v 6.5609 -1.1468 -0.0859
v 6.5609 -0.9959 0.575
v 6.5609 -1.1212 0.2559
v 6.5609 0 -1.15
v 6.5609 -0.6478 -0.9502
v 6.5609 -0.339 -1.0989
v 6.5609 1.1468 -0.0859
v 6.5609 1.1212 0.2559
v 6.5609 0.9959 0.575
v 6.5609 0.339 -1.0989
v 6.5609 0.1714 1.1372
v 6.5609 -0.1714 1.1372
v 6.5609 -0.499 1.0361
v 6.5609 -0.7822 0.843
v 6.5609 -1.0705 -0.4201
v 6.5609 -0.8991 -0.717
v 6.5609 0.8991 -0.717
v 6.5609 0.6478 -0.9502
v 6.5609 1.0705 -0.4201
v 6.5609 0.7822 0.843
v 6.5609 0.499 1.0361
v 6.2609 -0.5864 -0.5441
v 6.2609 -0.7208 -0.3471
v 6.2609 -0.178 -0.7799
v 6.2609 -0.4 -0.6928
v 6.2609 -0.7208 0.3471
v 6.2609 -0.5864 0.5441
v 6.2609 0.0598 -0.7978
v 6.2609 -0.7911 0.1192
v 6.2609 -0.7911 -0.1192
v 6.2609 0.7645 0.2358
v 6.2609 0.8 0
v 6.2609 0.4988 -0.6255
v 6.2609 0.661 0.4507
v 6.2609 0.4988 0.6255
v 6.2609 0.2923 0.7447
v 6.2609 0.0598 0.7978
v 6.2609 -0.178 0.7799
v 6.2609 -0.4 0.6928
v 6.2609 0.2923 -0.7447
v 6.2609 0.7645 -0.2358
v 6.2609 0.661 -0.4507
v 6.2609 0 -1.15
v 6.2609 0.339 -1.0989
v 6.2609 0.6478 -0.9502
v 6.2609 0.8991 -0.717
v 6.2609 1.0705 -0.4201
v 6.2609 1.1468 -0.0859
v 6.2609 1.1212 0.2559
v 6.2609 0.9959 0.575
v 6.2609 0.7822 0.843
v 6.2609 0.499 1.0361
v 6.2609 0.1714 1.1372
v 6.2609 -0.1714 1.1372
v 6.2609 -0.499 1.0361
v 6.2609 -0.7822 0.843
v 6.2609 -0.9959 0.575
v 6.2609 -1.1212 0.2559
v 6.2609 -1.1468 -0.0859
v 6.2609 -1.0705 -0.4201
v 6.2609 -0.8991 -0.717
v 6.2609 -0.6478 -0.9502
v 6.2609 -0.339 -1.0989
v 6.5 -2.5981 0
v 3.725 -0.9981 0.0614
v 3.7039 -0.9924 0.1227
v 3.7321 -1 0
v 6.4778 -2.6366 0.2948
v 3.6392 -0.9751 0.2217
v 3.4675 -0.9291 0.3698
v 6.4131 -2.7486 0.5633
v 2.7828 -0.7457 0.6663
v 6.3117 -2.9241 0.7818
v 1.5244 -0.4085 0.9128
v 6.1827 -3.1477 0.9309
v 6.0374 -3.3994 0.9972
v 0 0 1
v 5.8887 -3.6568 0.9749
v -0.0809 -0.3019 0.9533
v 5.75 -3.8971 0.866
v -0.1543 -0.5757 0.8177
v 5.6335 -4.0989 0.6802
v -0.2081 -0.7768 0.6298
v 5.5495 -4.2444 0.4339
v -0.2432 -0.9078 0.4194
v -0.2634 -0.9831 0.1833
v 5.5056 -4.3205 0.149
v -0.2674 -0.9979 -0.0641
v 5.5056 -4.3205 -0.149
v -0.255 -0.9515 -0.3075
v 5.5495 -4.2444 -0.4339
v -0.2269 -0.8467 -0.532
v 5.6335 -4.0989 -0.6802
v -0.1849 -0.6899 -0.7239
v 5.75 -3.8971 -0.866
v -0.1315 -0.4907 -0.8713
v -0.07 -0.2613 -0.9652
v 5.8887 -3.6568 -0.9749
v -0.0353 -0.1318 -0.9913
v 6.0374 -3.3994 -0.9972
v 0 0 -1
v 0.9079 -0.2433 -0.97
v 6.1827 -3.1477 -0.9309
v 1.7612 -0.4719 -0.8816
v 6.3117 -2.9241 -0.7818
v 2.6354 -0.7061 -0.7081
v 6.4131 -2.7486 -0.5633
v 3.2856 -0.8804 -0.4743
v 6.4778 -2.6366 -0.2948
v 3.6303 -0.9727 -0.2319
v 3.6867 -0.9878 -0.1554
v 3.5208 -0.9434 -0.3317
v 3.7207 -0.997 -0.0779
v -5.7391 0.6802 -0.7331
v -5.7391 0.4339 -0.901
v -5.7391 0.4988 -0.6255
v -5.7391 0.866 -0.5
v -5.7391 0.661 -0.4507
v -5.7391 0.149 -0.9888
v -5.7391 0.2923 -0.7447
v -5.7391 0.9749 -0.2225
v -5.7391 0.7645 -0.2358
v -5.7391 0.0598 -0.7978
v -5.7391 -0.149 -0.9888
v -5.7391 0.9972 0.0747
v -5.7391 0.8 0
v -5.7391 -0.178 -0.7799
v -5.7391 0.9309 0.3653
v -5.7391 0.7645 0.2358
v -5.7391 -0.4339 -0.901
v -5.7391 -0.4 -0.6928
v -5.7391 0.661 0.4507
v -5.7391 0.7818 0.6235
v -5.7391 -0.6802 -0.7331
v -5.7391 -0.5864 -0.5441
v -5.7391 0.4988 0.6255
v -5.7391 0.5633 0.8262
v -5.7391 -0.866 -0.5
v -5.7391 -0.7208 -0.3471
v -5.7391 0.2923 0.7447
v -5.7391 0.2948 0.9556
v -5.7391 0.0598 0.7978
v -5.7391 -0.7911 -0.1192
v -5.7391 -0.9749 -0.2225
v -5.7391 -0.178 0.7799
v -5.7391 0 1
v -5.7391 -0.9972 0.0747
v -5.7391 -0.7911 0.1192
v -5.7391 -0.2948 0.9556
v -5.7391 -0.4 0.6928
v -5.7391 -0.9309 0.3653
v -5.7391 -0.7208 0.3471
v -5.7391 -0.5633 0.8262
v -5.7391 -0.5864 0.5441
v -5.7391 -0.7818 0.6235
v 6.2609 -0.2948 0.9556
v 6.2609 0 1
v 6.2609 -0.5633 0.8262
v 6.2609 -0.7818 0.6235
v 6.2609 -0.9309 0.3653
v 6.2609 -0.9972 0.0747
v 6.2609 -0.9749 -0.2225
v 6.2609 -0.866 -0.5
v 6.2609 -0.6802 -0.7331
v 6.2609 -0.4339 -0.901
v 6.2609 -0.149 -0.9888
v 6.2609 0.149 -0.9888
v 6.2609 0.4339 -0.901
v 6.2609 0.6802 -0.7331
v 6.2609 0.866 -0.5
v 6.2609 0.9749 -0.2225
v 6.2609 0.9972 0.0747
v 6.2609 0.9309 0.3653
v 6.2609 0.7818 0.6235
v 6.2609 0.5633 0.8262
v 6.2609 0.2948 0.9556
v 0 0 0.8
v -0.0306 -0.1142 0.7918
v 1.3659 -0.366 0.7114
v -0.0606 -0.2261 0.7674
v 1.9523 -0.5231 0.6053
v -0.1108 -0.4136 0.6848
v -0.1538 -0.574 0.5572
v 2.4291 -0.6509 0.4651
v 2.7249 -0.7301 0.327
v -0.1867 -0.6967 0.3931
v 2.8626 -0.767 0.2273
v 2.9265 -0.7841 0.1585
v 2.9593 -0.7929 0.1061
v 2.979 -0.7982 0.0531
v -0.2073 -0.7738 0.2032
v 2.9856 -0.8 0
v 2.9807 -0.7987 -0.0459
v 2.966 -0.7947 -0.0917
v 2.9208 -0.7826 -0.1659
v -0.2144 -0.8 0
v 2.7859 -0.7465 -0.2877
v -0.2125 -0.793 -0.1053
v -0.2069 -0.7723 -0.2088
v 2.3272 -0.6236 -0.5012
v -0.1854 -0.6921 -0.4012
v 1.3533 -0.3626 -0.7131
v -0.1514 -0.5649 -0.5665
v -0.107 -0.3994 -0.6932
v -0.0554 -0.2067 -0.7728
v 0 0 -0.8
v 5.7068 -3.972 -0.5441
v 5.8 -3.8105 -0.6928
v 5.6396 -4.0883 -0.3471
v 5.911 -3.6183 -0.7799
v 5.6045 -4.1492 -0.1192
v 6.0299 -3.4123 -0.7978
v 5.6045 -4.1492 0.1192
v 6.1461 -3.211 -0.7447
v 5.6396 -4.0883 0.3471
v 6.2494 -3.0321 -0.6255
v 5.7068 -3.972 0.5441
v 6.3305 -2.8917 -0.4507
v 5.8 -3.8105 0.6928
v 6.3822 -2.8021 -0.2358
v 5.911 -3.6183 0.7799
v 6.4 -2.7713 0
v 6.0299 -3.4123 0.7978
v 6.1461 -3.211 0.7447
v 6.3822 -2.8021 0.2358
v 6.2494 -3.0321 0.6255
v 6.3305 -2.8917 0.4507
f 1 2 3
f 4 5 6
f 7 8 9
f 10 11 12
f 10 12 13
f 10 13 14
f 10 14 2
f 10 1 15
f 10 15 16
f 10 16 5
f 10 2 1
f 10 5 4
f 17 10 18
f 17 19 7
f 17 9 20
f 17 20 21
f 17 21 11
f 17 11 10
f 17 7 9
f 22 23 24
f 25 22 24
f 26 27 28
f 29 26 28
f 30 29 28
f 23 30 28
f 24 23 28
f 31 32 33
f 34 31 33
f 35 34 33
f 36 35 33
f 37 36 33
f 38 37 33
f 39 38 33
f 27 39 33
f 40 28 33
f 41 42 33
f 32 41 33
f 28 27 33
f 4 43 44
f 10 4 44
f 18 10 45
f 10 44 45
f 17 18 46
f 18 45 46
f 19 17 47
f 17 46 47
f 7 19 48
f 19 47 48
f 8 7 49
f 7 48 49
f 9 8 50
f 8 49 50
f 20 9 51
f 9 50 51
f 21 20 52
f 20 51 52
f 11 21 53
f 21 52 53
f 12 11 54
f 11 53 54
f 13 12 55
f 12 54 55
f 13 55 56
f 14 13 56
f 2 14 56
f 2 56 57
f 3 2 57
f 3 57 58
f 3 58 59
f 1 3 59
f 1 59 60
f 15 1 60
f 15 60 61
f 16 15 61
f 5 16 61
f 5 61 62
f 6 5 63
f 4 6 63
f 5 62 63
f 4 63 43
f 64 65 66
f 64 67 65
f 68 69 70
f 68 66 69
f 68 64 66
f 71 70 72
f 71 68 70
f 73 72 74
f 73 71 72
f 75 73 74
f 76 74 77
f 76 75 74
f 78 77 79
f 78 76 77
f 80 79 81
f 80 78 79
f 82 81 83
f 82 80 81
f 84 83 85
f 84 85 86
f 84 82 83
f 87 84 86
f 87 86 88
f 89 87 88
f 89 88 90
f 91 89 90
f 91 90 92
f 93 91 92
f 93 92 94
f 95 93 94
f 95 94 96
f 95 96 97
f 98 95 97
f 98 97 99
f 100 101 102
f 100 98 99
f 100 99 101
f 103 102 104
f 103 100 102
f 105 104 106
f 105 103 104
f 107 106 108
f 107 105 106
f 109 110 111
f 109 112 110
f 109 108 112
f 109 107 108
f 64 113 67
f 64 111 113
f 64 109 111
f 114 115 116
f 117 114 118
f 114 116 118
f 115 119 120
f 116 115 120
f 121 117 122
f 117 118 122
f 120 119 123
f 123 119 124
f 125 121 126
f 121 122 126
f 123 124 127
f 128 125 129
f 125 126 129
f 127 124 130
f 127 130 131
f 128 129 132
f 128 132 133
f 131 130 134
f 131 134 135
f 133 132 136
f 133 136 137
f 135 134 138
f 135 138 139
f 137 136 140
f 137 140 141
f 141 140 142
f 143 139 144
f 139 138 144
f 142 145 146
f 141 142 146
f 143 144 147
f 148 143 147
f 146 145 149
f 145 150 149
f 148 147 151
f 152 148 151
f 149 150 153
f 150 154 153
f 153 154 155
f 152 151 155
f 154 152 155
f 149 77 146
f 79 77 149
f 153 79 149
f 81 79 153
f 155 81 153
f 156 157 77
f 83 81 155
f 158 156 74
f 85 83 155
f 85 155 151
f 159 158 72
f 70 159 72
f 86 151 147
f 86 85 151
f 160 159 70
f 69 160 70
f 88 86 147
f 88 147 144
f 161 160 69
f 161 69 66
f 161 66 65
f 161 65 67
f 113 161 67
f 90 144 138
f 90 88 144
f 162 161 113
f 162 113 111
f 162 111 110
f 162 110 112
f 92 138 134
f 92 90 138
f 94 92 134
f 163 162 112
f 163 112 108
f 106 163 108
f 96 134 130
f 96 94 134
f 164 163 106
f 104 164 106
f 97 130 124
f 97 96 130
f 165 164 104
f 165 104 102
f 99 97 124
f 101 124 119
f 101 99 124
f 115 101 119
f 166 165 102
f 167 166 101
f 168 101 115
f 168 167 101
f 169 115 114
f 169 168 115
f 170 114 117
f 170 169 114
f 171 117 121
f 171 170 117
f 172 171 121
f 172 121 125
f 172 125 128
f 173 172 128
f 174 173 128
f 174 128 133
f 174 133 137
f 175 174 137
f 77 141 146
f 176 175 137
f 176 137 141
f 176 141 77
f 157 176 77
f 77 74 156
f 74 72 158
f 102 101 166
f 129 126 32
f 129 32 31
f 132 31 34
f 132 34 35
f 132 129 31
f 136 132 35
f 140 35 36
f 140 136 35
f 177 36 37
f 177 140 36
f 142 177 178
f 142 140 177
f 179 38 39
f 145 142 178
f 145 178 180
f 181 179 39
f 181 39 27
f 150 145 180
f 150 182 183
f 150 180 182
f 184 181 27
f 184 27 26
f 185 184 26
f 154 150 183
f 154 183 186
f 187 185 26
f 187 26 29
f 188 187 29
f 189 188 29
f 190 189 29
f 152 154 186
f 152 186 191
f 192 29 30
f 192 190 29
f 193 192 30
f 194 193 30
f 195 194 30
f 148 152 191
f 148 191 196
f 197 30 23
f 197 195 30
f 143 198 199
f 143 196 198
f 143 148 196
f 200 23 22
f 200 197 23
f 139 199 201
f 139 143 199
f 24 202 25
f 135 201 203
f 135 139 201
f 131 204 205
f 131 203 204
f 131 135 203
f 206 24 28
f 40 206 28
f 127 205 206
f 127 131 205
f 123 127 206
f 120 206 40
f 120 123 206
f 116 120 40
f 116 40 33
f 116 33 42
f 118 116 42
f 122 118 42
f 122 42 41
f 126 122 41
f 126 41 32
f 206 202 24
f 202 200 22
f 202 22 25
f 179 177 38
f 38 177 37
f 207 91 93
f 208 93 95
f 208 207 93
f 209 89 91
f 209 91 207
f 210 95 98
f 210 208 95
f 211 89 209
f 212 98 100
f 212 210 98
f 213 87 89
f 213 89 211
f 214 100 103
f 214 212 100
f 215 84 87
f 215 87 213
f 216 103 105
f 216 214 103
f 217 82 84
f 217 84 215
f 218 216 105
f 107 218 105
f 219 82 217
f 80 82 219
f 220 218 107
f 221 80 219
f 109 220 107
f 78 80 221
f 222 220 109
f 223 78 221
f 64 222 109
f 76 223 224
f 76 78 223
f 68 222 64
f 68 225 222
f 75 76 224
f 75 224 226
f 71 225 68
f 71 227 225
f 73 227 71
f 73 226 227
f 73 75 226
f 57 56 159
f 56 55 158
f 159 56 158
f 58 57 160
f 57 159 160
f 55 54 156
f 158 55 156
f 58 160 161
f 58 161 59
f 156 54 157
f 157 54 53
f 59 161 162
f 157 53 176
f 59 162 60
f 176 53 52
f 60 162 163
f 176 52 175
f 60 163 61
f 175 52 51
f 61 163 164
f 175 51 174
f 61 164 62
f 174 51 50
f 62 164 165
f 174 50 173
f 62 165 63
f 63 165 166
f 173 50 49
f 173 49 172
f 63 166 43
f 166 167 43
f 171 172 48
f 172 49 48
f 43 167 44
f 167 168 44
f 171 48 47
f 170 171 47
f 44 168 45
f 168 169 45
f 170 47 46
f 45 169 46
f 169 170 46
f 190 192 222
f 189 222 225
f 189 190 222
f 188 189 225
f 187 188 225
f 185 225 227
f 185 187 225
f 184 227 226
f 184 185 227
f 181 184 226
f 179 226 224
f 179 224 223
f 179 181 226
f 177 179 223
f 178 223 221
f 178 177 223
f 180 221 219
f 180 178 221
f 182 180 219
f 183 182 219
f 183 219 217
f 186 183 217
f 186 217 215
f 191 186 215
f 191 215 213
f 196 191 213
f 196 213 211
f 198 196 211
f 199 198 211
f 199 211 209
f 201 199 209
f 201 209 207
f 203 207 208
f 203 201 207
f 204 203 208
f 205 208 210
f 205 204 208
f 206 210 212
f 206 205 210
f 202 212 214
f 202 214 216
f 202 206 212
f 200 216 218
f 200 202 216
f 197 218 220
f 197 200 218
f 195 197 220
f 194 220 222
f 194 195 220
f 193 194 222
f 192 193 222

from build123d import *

# Parameters (mm, degrees)
SWEEP1_PROFILE_R    = 10
SWEEP2_PROFILE_R    = 10
SHELL2_START        = -57.391158908
SHELL2_OUTLINE_R    = 8
SHELL2_DEPTH        = 120
SHELL2_START_2      = -1e-07
SHELL2_2_OUTLINE_R  = 8
SHELL2_2_DEPTH      = 69.282032403
SKETCH27_R          = 11.5
BOSS_EXTRUDE2_DEPTH = 3
SCALE1_SCALE        = 0.1


with BuildPart() as part:
    # Sweep1: sweep along a path in Sketch3
    with BuildLine(Plane.XY) as sweep1_path:
        Line((-57.391158908, 0), (62.608841092, 0))
    # Sweep1 profile (on start of the path) → Sweep1 (sweep)
    with BuildSketch(Plane(origin=(-57.391158908, 0, 0), x_dir=(0, 0, 1), z_dir=(1, 0, 0))):
        Circle(SWEEP1_PROFILE_R)
    sweep(path=sweep1_path.line)

    # Sweep2: sweep along a path in Sketch3<4>
    with BuildLine(Plane.XY) as sweep2_path:
        Line((0, 0), (60, -34.641016151))
    # Sweep2 profile (on start of the path) → Sweep2 (sweep)
    with BuildSketch(Plane(origin=(0, 0, 0), x_dir=(0.500000000000001, 0.8660254037844382, 0), z_dir=(0.8660254037844382, -0.500000000000001, 0))):
        Circle(SWEEP2_PROFILE_R)
    sweep(path=sweep2_path.line)

    # Shell2: read off the stored shape, not the designer's step
    # Shell2 outline → Shell2 (cut)
    with BuildSketch(Plane.YZ.offset(SHELL2_START)):
        Circle(SHELL2_OUTLINE_R)
    extrude(amount=SHELL2_DEPTH, mode=Mode.SUBTRACT)

    # Shell2 2 outline → Shell2 2 (cut)
    with BuildSketch(Plane(origin=(0, 0, 0), x_dir=(0.500000000000001, 0.866025403784438, 0), z_dir=(0.866025403784438, -0.500000000000001, 0)).offset(SHELL2_START_2)):
        Circle(SHELL2_2_OUTLINE_R)
    extrude(amount=SHELL2_2_DEPTH, mode=Mode.SUBTRACT)

    # Sketch27 → Boss-Extrude2 (add)
    with BuildSketch(Plane(origin=(62.608841092, 0, 0), x_dir=(0, 0, -1), z_dir=(1, 0, 0))):
        Circle(SKETCH27_R)
    extrude(amount=BOSS_EXTRUDE2_DEPTH)


with BuildPart() as part_1:
    # Scale1: scaled about (0, 0, 0)
    add(part.part.scale(SCALE1_SCALE))


solid = part_1.part
